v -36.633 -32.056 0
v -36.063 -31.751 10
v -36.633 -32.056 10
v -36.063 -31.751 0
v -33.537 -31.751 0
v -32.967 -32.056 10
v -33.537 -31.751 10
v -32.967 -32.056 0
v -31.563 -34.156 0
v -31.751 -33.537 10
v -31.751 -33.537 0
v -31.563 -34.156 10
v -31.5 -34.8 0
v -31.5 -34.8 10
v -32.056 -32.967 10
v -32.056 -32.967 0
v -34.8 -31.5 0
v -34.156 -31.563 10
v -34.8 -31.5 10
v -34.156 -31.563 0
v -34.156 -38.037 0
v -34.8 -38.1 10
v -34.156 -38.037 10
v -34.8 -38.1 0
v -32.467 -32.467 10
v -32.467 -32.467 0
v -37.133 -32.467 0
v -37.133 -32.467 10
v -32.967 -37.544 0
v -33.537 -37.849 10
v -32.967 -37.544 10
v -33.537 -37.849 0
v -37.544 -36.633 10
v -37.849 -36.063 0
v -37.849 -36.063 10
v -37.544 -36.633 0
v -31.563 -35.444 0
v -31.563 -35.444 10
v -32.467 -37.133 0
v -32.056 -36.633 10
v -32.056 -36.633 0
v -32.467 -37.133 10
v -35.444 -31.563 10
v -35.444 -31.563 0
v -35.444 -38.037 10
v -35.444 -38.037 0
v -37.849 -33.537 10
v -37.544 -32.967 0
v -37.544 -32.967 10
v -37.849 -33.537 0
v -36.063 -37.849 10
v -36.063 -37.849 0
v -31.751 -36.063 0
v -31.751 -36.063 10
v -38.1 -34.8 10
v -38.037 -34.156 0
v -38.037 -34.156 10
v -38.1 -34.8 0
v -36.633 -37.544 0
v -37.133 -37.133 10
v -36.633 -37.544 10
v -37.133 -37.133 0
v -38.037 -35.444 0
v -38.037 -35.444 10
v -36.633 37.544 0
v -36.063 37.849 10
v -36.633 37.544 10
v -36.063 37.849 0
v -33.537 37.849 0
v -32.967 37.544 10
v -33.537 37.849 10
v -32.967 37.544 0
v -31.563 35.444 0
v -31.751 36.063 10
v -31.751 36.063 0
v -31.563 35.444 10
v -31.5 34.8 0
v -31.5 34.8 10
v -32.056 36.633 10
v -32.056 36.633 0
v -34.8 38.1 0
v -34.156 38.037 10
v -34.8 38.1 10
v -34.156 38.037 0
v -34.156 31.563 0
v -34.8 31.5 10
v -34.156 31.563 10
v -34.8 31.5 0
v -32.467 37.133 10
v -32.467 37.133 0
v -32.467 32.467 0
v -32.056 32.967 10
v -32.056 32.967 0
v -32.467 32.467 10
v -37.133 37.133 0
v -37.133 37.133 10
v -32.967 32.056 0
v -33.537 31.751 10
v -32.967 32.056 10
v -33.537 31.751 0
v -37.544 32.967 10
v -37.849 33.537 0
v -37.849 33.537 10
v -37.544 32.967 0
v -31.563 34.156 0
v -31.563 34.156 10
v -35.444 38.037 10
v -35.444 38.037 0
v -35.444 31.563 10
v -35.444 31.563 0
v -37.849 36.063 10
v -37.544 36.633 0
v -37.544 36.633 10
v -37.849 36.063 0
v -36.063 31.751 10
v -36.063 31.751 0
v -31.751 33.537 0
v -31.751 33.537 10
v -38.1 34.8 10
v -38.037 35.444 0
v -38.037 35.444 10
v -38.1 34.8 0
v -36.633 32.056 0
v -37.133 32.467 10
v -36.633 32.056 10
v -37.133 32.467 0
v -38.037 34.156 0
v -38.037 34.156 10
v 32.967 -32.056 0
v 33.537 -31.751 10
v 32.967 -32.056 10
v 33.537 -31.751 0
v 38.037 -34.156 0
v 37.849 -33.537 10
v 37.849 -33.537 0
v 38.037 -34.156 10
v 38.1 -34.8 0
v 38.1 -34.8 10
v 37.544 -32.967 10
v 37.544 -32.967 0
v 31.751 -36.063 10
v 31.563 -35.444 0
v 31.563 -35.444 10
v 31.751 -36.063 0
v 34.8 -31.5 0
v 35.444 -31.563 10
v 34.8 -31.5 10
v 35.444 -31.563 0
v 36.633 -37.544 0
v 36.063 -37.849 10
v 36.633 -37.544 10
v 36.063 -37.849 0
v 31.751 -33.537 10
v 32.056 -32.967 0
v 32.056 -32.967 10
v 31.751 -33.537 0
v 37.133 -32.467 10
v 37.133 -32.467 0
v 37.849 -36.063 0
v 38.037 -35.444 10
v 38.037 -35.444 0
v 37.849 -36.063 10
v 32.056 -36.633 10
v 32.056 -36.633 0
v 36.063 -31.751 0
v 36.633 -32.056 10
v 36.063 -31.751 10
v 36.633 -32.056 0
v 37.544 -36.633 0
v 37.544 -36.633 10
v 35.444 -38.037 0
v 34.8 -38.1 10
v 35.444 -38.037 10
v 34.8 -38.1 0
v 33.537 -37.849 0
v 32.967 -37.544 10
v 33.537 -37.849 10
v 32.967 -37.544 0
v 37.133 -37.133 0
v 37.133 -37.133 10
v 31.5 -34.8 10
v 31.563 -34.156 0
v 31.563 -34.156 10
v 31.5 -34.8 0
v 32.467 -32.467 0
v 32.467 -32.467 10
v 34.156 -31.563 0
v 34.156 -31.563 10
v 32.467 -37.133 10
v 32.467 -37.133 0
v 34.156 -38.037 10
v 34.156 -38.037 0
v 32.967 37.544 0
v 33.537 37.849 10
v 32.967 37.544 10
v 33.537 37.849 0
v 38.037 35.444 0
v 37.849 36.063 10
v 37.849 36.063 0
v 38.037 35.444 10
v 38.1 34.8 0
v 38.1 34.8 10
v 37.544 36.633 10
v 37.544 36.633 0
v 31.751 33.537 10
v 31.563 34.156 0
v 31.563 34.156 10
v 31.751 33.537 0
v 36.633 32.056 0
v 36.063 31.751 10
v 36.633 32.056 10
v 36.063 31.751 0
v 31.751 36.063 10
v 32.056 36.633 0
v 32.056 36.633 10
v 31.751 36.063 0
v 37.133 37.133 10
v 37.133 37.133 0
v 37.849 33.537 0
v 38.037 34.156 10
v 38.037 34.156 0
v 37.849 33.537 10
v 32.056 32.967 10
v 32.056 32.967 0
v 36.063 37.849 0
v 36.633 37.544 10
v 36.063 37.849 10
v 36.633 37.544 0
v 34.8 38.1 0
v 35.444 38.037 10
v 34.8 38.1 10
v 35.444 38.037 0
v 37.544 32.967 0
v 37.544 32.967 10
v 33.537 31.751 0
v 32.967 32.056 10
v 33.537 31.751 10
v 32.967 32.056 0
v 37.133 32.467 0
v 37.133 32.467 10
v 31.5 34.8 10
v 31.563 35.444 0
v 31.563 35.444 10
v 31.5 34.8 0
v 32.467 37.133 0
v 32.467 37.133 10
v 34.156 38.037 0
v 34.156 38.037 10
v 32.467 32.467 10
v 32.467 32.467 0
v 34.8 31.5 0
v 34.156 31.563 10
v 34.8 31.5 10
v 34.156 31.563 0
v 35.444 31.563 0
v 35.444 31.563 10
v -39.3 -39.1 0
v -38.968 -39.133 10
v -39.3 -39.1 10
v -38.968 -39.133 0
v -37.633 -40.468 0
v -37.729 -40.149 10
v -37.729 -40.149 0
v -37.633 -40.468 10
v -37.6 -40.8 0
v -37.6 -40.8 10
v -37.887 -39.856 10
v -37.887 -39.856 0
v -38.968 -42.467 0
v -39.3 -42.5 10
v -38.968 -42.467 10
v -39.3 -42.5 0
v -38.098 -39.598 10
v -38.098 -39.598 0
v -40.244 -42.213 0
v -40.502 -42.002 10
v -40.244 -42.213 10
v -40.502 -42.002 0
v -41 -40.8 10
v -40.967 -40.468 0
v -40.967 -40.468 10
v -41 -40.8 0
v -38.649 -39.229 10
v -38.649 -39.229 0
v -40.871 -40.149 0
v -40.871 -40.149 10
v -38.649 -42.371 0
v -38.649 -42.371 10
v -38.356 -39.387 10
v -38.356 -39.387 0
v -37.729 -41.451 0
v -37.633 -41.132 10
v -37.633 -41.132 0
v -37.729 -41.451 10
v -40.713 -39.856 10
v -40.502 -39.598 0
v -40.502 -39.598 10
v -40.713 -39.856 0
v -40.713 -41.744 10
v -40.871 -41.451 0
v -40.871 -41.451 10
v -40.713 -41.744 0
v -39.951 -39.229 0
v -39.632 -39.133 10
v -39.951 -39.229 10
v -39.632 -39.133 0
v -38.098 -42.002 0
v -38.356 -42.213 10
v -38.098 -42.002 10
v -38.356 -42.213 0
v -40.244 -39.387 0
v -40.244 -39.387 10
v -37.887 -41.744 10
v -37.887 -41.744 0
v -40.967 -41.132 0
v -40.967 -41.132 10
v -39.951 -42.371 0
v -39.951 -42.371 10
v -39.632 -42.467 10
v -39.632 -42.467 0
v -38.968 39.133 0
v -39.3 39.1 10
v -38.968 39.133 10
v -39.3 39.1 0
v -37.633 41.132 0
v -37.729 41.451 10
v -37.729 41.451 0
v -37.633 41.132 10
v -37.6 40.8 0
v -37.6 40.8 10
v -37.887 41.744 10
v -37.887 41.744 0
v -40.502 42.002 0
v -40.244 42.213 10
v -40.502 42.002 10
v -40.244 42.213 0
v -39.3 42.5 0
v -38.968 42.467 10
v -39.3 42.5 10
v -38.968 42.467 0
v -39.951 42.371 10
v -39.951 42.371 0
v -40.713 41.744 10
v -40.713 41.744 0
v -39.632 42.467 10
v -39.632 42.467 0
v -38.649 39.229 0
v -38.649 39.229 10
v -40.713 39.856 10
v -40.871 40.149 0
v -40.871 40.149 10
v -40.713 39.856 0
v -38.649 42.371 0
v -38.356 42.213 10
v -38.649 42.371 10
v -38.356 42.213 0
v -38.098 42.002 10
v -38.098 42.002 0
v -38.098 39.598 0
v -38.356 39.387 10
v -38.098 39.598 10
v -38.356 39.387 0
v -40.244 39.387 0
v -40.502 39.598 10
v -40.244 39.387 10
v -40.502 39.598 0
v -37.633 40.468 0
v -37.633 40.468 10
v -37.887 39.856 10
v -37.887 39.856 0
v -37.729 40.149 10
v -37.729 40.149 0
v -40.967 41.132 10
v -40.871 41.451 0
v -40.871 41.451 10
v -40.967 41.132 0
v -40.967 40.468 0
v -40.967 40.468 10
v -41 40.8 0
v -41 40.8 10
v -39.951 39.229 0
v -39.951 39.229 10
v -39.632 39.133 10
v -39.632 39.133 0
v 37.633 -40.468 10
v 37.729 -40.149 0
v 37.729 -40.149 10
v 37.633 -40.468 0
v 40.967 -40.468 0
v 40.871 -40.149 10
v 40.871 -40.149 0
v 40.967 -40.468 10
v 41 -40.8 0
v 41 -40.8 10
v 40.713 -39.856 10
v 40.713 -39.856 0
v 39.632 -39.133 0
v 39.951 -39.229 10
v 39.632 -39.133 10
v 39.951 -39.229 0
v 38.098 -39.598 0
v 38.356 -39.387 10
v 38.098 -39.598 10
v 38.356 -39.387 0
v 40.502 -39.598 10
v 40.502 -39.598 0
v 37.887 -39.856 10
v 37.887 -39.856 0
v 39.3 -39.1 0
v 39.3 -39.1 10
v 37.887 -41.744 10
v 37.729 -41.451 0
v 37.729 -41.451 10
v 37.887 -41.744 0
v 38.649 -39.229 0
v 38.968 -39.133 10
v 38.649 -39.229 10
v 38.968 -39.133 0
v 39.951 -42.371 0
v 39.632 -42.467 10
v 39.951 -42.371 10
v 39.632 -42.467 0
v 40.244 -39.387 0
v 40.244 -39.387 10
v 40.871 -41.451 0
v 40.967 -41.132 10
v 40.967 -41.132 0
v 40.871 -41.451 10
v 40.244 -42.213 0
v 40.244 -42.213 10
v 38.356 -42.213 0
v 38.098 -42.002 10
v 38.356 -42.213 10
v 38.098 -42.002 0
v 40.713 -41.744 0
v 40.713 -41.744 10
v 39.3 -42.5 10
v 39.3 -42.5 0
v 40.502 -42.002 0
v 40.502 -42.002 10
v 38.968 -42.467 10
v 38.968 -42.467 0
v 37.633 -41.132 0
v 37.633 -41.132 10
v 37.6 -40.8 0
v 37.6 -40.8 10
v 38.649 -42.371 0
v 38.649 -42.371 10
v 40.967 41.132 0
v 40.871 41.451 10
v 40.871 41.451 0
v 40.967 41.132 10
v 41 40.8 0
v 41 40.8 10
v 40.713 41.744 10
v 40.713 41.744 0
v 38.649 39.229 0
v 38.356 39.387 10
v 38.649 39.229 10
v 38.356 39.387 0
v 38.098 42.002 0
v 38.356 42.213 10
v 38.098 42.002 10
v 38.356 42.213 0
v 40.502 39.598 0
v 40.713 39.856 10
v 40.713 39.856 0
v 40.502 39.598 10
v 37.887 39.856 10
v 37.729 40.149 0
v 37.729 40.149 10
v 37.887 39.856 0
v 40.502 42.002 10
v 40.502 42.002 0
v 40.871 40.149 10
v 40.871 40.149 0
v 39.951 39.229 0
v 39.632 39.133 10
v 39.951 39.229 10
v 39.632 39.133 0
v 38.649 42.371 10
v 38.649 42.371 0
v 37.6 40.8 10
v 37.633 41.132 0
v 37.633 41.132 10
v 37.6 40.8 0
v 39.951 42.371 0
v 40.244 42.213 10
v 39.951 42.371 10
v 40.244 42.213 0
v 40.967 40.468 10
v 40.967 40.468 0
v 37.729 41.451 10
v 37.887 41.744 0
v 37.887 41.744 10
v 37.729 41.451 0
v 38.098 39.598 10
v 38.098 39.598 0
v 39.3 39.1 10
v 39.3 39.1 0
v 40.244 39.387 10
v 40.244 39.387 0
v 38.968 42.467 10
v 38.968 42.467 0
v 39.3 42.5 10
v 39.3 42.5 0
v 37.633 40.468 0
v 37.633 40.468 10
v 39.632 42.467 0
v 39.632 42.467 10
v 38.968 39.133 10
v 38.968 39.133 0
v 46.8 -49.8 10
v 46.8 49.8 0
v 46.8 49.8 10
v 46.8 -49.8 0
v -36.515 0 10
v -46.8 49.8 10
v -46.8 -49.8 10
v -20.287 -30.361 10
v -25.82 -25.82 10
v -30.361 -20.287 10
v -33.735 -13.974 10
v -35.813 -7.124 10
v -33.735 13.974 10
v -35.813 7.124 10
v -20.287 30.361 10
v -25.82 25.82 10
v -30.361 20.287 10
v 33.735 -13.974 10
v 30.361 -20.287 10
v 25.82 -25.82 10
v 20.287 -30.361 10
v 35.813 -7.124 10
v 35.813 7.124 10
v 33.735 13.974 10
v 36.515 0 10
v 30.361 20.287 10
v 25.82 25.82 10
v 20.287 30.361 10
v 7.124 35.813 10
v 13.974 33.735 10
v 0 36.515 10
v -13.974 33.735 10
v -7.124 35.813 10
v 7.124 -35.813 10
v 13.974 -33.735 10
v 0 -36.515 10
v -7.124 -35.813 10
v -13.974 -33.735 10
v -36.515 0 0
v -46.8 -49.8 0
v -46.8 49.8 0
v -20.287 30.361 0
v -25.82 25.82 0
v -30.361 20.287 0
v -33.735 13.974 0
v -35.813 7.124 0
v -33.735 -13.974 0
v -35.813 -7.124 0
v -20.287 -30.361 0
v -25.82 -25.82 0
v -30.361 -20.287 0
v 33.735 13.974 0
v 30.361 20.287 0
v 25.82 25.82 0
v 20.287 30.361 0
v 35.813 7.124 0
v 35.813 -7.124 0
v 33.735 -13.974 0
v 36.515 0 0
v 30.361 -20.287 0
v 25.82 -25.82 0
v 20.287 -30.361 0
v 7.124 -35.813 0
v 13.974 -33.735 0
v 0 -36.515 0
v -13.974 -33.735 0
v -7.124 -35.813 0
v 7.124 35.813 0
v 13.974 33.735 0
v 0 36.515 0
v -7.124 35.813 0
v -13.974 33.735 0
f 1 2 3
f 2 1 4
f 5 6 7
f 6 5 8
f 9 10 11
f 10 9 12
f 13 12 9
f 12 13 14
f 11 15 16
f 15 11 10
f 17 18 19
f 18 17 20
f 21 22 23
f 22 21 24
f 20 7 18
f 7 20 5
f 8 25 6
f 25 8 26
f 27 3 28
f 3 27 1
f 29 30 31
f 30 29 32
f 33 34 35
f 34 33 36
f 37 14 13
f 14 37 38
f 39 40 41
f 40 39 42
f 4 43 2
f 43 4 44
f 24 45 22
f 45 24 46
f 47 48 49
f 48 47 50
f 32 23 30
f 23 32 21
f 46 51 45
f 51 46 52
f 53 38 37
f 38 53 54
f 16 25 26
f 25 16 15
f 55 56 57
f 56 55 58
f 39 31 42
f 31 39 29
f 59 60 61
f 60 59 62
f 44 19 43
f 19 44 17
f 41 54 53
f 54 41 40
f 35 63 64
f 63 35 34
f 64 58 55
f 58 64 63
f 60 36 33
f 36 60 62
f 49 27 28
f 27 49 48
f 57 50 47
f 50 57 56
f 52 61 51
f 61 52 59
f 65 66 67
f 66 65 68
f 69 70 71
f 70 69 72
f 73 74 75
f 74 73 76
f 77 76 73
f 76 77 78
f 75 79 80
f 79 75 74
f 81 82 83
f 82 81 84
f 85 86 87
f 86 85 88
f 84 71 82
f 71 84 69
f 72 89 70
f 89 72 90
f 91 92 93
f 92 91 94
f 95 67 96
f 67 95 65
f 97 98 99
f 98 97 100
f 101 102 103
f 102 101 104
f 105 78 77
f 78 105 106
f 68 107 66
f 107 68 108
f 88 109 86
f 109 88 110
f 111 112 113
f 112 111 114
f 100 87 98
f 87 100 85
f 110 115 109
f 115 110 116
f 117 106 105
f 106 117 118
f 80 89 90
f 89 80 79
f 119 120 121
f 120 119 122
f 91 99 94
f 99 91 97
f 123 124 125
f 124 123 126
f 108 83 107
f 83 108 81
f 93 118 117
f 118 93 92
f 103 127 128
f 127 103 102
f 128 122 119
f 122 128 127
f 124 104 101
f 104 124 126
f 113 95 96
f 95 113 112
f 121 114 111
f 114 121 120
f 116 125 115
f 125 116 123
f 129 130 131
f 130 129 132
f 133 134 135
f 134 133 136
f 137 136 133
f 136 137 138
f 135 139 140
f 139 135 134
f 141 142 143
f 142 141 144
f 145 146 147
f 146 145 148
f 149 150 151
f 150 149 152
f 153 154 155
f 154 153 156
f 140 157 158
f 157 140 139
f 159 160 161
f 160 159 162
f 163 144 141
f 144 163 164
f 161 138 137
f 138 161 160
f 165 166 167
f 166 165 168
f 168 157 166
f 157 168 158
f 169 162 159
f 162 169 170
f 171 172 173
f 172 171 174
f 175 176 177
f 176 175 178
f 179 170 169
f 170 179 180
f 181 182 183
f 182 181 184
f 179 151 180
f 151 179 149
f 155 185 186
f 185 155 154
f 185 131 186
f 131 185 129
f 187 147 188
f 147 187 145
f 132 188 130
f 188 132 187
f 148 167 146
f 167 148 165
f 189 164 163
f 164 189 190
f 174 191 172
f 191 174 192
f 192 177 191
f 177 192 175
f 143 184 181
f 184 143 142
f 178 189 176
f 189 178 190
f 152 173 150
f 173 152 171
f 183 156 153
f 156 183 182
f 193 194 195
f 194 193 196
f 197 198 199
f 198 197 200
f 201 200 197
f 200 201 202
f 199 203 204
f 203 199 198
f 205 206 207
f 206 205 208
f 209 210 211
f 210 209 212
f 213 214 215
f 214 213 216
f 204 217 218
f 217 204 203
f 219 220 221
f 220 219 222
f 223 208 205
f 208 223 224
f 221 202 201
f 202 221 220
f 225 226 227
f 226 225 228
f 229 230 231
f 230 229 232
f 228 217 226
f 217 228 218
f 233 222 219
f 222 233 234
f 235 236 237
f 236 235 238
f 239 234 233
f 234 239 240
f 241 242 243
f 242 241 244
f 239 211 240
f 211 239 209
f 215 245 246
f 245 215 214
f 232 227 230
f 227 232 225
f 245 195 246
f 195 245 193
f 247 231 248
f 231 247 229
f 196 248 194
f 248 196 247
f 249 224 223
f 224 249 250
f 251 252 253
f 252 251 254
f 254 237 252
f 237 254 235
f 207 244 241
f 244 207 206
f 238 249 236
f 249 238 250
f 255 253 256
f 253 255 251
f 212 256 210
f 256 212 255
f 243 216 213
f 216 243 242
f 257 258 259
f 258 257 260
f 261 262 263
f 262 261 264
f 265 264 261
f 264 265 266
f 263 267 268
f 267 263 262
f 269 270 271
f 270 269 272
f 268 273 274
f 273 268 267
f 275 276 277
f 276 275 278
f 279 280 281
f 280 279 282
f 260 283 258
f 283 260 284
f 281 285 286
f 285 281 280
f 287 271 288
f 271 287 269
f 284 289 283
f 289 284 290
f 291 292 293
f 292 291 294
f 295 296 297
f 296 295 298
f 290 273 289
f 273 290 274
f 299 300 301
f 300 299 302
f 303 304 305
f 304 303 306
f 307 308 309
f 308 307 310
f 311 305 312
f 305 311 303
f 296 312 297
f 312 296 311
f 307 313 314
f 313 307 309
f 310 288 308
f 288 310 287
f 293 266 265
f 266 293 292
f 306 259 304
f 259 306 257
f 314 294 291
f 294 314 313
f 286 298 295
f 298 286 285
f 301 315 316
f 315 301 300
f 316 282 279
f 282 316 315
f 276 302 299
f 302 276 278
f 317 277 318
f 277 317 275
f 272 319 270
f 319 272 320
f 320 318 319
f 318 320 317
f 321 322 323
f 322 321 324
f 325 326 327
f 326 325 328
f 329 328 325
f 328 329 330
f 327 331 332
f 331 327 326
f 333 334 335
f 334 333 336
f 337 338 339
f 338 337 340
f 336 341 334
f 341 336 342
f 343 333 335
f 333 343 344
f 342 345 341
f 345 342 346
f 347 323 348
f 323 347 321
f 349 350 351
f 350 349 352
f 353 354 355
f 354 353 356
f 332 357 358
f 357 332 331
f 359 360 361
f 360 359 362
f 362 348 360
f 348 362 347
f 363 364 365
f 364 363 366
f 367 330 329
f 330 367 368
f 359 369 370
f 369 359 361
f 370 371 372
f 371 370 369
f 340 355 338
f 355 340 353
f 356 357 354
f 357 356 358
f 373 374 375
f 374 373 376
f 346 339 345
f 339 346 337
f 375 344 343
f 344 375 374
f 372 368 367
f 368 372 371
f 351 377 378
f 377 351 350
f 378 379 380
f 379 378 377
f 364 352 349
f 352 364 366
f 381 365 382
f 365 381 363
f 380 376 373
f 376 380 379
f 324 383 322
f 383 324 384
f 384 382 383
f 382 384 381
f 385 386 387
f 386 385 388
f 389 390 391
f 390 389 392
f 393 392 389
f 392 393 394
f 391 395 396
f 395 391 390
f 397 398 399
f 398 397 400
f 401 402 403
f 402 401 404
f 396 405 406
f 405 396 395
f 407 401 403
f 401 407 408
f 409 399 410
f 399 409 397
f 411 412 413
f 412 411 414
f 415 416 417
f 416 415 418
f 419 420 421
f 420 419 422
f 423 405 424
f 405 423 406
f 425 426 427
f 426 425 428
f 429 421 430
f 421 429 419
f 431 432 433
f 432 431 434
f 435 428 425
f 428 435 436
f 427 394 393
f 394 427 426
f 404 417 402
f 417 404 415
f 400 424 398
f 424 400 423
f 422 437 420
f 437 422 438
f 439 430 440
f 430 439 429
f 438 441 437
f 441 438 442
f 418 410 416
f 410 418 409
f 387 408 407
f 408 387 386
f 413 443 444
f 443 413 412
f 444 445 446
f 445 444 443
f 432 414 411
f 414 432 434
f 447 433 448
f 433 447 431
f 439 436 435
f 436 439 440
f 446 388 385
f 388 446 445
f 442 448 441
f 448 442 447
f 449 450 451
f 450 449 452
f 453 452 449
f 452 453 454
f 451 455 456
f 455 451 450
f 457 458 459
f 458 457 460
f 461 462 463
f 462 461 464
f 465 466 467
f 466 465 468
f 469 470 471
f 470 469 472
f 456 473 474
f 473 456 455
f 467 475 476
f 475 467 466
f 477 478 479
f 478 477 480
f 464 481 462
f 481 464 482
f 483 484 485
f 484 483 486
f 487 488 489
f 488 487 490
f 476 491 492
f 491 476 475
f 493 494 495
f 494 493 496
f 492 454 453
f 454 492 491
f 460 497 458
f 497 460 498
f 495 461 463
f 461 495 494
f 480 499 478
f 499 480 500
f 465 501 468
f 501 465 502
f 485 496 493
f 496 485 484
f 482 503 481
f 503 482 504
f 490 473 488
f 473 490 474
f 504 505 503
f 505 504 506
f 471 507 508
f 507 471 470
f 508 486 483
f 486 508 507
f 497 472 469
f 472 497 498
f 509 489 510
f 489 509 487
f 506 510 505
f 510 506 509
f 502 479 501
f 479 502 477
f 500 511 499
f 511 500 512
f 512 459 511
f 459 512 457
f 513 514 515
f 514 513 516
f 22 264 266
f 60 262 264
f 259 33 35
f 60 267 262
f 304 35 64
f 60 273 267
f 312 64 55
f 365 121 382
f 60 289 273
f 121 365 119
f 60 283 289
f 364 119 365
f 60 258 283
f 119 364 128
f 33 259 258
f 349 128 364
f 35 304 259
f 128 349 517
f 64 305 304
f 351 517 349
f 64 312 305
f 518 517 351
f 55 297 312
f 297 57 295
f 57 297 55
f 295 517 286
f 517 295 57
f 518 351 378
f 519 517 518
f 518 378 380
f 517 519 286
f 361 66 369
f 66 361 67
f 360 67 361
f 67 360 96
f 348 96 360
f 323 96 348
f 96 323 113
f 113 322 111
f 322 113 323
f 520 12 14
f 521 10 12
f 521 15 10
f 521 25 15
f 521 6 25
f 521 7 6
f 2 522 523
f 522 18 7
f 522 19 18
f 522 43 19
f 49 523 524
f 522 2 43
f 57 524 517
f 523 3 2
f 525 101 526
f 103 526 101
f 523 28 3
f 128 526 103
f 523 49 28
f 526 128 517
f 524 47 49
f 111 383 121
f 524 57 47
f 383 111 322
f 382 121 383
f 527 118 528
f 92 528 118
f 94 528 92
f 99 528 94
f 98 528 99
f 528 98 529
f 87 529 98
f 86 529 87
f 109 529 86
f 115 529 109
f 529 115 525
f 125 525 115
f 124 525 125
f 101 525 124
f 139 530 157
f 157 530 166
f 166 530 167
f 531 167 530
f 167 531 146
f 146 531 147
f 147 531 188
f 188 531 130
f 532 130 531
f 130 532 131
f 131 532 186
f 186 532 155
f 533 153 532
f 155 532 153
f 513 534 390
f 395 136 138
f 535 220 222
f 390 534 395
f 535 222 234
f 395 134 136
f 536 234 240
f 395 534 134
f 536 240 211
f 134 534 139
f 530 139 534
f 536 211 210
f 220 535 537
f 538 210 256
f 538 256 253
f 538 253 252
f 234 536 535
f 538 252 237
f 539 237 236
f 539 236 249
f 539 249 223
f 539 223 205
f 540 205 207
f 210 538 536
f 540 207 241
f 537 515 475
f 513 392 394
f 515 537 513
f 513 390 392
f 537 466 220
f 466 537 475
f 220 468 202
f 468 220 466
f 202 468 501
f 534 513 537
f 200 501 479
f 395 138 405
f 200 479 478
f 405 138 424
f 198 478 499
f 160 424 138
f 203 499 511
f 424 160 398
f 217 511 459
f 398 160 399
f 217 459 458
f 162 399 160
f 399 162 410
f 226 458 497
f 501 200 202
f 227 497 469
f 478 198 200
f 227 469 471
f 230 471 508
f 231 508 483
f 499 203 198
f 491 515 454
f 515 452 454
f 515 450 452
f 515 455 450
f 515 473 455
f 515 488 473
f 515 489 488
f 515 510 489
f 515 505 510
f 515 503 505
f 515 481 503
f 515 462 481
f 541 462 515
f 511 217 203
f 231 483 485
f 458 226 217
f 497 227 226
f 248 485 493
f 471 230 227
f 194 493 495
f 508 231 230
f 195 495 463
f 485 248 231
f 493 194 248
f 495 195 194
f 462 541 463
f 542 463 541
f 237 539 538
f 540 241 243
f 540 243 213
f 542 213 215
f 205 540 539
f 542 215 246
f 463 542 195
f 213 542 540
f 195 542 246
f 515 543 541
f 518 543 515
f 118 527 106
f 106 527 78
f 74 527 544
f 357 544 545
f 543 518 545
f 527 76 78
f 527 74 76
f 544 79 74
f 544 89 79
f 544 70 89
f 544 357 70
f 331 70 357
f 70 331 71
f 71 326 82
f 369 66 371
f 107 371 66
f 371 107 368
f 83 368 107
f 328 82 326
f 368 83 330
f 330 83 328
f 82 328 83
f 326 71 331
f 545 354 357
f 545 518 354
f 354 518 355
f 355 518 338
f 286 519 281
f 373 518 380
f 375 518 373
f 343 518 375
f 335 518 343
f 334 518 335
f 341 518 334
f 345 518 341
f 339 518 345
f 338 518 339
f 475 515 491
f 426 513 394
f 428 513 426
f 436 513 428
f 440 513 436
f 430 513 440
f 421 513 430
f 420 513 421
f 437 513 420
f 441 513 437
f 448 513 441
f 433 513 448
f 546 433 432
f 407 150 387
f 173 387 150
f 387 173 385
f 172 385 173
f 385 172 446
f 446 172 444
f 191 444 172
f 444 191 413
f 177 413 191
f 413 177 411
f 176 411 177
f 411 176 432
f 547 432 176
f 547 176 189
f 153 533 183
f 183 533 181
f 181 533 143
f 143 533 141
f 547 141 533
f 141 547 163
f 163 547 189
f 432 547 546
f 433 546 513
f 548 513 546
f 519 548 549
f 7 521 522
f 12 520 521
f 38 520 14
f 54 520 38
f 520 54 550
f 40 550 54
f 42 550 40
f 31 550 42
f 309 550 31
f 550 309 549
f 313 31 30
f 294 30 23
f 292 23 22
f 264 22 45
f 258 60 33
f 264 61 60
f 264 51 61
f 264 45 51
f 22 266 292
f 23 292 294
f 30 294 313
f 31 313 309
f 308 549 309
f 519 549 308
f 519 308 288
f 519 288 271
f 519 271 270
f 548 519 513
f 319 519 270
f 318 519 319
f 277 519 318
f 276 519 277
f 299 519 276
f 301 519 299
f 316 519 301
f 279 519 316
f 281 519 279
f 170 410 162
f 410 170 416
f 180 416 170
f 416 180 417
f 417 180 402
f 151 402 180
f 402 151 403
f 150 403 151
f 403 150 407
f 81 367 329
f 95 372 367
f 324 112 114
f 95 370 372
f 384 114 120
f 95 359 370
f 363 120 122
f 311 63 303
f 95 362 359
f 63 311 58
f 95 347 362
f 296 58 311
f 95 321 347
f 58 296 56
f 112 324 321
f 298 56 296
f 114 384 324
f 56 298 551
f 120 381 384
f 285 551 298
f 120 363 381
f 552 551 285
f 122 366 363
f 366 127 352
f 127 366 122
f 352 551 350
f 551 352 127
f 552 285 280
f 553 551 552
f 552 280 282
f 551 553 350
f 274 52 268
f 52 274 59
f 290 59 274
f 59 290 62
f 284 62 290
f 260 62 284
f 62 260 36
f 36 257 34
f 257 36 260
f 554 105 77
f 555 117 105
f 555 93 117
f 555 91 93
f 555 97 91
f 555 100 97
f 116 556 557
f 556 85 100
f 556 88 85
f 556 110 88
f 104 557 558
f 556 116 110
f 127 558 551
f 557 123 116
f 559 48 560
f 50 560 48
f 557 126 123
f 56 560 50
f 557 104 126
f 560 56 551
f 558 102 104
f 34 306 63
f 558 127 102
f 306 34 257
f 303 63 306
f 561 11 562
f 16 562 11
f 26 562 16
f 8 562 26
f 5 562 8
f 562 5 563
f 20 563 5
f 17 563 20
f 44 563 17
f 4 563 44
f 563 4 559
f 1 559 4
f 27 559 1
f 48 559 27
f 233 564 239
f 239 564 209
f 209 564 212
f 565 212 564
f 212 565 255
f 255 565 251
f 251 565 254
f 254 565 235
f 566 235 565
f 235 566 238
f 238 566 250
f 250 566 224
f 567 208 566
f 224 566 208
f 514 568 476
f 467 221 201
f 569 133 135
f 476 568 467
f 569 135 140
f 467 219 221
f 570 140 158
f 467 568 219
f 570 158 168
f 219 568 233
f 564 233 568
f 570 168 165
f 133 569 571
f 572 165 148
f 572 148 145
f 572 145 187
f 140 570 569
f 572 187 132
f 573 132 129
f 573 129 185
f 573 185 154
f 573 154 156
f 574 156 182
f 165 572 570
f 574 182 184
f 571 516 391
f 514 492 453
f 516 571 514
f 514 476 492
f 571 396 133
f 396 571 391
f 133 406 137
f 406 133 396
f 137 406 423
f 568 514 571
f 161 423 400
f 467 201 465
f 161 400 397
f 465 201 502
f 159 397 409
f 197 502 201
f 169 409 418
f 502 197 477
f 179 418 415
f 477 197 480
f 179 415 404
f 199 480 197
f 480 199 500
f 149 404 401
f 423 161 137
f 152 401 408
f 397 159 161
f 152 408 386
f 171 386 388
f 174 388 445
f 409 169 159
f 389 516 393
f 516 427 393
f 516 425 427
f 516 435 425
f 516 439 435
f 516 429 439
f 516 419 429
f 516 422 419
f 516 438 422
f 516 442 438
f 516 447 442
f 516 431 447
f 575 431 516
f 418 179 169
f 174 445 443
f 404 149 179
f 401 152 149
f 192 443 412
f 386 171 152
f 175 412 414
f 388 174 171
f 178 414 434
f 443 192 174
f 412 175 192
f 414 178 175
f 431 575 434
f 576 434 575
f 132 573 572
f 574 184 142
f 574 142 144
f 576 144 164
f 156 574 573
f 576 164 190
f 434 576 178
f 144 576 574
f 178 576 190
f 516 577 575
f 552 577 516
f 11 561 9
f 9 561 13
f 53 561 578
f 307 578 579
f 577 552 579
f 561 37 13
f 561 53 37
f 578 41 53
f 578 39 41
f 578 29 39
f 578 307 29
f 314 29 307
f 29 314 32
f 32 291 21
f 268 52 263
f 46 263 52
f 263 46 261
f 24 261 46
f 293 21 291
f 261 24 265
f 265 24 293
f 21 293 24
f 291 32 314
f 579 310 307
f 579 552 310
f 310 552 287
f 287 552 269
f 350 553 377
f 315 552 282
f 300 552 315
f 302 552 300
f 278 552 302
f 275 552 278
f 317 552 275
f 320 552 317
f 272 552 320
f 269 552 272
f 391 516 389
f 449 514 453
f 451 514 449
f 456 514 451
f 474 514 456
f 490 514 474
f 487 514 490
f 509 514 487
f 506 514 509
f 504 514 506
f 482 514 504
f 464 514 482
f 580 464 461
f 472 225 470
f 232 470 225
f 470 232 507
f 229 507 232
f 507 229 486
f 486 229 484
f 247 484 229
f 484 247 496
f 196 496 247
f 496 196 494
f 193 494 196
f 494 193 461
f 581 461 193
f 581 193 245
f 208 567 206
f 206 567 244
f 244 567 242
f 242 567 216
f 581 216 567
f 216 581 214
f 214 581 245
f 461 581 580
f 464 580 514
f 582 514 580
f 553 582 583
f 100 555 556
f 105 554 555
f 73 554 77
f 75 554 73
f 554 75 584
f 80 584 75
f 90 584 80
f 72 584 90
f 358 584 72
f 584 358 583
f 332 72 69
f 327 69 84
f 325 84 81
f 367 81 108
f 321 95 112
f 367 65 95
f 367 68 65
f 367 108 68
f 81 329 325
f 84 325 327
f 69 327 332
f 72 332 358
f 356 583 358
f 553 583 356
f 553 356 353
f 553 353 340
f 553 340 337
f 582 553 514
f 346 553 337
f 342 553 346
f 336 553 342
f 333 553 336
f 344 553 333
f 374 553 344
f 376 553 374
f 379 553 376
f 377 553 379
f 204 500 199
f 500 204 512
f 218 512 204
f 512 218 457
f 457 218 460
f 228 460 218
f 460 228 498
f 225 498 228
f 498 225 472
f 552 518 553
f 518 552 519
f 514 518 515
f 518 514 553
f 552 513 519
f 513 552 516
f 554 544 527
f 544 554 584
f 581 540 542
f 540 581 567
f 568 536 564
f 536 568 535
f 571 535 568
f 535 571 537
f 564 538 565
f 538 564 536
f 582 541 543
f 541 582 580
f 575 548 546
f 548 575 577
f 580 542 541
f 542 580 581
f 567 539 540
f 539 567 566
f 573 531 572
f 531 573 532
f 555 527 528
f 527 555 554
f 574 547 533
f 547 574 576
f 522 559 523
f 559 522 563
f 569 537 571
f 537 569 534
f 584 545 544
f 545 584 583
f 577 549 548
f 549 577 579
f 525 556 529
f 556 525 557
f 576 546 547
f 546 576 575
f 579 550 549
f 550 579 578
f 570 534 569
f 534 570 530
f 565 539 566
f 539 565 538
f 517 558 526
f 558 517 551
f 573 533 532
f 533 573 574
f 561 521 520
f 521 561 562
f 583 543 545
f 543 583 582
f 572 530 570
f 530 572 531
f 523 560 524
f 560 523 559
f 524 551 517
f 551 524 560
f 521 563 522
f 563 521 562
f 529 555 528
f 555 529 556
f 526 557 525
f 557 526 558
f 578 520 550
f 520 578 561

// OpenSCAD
$fn = 32;

// ----------------------------------------------------------------------
// Motor mount plate: NEMA34, 93.6 x 99.6 x 10 mm
// ----------------------------------------------------------------------

// --- parameters (mm) ---
plate_w = 93.6;           // plate length, X
plate_d = 99.6;           // plate width, Y
plate_t = 10;             // plate thickness
pattern = 69.6;           // NEMA34 bolt spacing
motor_d = 6.6;            // NEMA34 screw clearance
pilot_d = 73.03;          // pilot boss bore
second_d = 3.4;           // second fastener hole

module plate() {
  translate([-plate_w / 2, -plate_d / 2, 0]) cube([plate_w, plate_d, plate_t]);
}

module motor_holes() {
  for (sx = [-1, 1]) for (sy = [-1, 1])
    translate([sx * pattern / 2, sy * pattern / 2, -1])
      cylinder(h = plate_t + 2, d = motor_d);
}

difference() {
  union() {
    plate();
  }
  motor_holes();
  translate([0, 0, -1]) cylinder(h = plate_t + 2, d = pilot_d);
  for (sx = [-1, 1]) for (sy = [-1, 1])
    translate([sx * 39.3, sy * 40.8, -1]) cylinder(h = plate_t + 2, d = second_d);
}
